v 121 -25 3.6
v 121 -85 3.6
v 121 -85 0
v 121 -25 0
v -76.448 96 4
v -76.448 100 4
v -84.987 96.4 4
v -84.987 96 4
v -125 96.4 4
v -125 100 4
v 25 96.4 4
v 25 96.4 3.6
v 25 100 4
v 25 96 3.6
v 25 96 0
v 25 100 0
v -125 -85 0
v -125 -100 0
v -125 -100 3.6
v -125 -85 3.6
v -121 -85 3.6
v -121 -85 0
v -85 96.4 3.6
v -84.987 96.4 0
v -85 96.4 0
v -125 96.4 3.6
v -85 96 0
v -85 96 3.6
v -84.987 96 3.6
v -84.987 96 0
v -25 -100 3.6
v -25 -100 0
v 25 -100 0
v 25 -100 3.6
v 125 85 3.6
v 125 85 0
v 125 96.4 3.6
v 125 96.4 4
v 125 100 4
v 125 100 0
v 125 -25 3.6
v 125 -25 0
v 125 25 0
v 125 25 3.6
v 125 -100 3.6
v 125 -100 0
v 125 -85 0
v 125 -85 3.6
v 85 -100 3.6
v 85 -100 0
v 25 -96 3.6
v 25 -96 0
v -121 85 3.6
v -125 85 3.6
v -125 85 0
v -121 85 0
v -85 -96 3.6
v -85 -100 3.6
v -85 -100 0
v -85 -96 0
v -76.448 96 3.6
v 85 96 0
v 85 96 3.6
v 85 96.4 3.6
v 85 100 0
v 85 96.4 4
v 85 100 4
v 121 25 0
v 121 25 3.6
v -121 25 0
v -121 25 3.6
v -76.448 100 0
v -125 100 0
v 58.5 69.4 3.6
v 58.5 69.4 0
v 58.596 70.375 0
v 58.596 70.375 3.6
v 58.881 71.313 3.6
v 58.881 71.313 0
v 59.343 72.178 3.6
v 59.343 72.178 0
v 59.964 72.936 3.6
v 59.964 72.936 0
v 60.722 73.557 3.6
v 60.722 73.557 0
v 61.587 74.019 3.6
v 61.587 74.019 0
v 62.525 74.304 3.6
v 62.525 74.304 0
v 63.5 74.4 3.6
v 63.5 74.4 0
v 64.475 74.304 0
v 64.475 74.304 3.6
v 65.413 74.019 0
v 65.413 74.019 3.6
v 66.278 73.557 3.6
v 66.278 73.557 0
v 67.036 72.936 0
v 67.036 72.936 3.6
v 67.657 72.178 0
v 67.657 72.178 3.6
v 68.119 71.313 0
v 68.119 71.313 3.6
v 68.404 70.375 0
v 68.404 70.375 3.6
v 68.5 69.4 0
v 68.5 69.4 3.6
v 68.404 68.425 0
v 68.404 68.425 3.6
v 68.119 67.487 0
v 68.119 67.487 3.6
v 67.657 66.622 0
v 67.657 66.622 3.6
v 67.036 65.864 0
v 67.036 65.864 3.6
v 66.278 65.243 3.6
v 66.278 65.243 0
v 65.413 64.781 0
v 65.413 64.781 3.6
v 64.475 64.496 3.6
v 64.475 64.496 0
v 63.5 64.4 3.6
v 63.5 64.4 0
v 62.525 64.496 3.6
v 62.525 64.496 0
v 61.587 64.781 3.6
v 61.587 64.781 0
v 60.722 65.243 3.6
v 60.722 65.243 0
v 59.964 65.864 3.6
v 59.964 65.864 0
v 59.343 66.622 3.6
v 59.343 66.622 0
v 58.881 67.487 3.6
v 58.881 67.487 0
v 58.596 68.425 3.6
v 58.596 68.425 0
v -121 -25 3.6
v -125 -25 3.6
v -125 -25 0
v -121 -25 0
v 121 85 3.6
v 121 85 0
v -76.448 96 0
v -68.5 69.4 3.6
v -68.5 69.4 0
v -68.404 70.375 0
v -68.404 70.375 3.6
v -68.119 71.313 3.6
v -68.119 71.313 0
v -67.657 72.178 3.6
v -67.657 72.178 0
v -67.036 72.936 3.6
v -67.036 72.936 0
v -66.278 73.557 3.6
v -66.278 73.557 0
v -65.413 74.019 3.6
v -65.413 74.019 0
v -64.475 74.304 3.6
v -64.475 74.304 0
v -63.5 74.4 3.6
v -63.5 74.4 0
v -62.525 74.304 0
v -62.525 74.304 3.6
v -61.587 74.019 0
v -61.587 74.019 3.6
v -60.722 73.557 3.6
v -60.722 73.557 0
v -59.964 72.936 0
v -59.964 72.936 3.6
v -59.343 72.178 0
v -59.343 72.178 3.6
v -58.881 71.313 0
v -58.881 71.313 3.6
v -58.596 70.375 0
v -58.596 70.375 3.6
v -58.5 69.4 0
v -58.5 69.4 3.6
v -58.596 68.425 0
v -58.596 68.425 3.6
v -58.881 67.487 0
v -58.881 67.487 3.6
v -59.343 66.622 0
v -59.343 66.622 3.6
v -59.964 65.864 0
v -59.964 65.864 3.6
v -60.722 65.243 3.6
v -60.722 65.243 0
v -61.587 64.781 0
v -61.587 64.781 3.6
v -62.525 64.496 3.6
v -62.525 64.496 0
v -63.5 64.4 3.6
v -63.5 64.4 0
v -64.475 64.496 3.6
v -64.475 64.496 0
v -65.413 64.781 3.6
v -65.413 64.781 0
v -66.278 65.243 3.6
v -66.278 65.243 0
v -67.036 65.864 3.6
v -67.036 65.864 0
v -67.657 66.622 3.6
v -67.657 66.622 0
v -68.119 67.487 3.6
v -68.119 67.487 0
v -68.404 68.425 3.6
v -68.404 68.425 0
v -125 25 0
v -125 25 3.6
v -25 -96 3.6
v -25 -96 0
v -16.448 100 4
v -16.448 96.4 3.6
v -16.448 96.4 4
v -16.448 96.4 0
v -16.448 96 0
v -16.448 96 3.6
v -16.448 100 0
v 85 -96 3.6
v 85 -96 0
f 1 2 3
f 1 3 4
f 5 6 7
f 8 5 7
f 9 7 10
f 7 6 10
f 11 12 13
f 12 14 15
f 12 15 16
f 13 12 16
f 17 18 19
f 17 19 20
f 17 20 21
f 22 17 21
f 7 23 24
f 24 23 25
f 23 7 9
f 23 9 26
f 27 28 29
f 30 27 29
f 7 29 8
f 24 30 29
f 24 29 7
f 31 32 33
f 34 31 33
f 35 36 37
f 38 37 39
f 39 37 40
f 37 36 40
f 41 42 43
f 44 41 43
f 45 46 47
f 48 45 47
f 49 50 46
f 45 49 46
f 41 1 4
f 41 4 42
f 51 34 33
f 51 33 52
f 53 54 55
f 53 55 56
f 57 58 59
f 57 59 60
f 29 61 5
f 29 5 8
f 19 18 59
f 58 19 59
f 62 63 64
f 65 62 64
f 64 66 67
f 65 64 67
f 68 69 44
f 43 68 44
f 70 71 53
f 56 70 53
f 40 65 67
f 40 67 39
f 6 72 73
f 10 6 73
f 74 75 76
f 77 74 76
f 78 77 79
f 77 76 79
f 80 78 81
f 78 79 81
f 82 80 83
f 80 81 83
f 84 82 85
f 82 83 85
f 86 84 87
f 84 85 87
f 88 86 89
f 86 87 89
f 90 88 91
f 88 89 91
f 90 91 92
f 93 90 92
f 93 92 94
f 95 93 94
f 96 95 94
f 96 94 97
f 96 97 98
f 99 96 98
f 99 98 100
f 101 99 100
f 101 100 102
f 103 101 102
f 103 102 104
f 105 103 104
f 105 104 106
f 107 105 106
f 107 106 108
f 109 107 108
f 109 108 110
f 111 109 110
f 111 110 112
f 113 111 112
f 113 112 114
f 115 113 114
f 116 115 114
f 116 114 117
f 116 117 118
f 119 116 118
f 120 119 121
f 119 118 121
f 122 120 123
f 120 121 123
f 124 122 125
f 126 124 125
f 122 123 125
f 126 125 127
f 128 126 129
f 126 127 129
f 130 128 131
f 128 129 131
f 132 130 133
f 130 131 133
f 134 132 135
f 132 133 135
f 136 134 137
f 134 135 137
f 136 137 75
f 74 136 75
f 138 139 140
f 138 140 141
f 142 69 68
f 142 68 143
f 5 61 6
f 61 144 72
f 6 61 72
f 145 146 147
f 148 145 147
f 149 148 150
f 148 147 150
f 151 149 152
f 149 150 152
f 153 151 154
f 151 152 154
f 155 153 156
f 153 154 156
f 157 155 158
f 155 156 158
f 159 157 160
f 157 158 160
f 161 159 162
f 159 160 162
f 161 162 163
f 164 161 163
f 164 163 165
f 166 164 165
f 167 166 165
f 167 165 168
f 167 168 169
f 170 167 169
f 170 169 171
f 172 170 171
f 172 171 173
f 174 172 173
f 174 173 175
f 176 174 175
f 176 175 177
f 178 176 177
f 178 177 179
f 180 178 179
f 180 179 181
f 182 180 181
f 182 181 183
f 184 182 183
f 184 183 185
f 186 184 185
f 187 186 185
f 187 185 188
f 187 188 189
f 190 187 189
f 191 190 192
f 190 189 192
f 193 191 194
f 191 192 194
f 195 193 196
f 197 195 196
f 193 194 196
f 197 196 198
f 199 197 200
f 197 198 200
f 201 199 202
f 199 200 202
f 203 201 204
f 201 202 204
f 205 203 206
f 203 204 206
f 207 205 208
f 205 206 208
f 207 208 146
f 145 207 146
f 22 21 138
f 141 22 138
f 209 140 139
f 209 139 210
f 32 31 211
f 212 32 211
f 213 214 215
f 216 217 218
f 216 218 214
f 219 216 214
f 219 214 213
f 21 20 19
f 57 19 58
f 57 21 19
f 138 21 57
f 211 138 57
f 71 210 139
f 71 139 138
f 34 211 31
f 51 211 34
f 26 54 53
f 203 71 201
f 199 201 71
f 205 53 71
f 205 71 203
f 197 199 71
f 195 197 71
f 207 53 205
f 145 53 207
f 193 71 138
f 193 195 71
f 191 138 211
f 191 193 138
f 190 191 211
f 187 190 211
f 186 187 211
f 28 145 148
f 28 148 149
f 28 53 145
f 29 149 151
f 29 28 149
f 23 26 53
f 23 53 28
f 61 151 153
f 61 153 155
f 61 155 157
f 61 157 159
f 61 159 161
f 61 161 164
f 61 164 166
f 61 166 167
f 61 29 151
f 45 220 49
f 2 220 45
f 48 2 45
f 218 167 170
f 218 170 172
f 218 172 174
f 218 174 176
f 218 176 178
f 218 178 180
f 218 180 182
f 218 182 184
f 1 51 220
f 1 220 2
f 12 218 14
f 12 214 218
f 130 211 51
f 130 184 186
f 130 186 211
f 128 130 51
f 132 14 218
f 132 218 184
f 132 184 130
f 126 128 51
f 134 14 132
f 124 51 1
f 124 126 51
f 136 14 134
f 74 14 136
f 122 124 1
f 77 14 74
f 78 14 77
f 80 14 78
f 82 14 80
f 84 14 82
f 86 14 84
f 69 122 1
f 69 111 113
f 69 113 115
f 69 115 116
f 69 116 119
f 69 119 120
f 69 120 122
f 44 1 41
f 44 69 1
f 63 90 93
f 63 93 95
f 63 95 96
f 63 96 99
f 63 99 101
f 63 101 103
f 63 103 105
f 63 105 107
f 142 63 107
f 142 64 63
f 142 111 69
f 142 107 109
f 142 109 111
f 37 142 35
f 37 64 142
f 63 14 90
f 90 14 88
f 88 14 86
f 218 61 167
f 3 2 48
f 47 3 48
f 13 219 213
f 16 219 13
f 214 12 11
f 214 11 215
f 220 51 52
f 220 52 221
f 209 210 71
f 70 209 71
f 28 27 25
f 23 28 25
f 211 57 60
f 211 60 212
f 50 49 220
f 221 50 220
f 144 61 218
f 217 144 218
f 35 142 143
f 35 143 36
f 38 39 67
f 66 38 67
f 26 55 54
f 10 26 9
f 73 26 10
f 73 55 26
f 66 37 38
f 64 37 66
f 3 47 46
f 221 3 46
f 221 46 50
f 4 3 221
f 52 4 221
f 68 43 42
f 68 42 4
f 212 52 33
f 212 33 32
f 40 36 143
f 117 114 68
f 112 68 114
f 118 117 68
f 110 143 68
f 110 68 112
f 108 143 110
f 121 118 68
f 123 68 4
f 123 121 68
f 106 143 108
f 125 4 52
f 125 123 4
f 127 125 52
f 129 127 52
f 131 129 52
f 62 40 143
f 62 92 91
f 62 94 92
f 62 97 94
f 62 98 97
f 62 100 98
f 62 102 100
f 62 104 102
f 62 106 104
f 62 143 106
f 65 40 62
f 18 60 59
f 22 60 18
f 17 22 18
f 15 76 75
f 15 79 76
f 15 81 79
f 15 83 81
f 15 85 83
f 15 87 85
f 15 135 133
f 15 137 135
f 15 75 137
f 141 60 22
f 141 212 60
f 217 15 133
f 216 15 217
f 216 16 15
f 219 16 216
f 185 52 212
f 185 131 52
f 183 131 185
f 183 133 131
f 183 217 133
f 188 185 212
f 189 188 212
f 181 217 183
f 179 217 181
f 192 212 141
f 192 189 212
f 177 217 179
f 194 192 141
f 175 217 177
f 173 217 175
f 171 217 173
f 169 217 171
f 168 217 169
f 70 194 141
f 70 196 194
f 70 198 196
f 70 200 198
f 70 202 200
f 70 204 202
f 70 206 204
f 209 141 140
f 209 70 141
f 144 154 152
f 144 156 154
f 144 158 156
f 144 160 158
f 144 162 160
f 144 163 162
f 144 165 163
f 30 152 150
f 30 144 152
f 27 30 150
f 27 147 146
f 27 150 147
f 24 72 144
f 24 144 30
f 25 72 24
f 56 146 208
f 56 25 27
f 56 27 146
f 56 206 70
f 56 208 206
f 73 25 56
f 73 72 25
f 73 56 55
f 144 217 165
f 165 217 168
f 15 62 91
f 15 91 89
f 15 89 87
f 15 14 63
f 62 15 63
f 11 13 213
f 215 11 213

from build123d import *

# Parameters (mm, degrees)
SKETCH_1_W          = 250
SKETCH_1_H          = 200
EXTRUDE_1_DEPTH     = 3.6
SKETCH_2_W          = 4
SKETCH_2_H          = 60
CUT_EXTRUDE_1_DEPTH = 10
SKETCH_3_W          = 60
SKETCH_3_H          = 4
CUT_EXTRUDE_2_DEPTH = 10
SKETCH_4_R          = 5
CUT_EXTRUDE_3_DEPTH = 10
SKETCH_5_W          = 250
SKETCH_5_H          = 3.6
EXTRUDE_2_DEPTH     = 4
SKETCH_6_W          = 60
SKETCH_6_H          = 4
CUT_EXTRUDE_4_DEPTH = 161.128073741
SKETCH_7_W          = 4
SKETCH_7_H          = 3.6
EXTRUDE_3_DEPTH     = 8.5
SKETCH_8_W          = 68.538276959
SKETCH_8_H          = 3.6
CUT_EXTRUDE_5_DEPTH = 8.5
SKETCH_9_W          = 8.538276959
SKETCH_9_H          = 4
EXTRUDE_4_DEPTH     = 4
SKETCH_10_W         = 60
SKETCH_10_H         = 4
CUT_EXTRUDE_6_DEPTH = 8.5


with BuildPart() as part:
    # 草图1 → 凸台-拉伸1 (new body)
    with BuildSketch(Plane.XY):
        Rectangle(SKETCH_1_W, SKETCH_1_H)
    extrude(amount=EXTRUDE_1_DEPTH)

    # 草图2 → 切除-拉伸1 (cut)
    with BuildSketch(Plane.XY.offset(3.6)):
        with Locations((-123, 55)):
            Rectangle(SKETCH_2_W, SKETCH_2_H)
        with Locations((123, 55)):
            Rectangle(SKETCH_2_W, SKETCH_2_H)
        with Locations((-123, -55)):
            Rectangle(SKETCH_2_W, SKETCH_2_H)
        with Locations((123, -55)):
            Rectangle(SKETCH_2_W, SKETCH_2_H)
    extrude(amount=-CUT_EXTRUDE_1_DEPTH, mode=Mode.SUBTRACT)

    # 草图3 → 切除-拉伸2 (cut)
    with BuildSketch(Plane.XY.offset(3.6)):
        with Locations((-55, -98)):
            Rectangle(SKETCH_3_W, SKETCH_3_H)
        with Locations((55, -98)):
            Rectangle(SKETCH_3_W, SKETCH_3_H)
        with Locations((55, 98)):
            Rectangle(SKETCH_3_W, SKETCH_3_H)
        with Locations((-55, 98)):
            Rectangle(SKETCH_3_W, SKETCH_3_H)
    extrude(amount=-CUT_EXTRUDE_2_DEPTH, mode=Mode.SUBTRACT)

    # 草图4 → 切除-拉伸3 (cut)
    with BuildSketch(Plane(origin=(0, 0, 0), x_dir=(-1, 0, 0), z_dir=(0, 0, -1))):
        with Locations((-63.5, 69.4)):
            Circle(SKETCH_4_R)
        with Locations((63.5, 69.4)):
            Circle(SKETCH_4_R)
    extrude(amount=-CUT_EXTRUDE_3_DEPTH, mode=Mode.SUBTRACT)

    # 草图5 → 凸台-拉伸2 (add)
    with BuildSketch(Plane(origin=(0, 0, 0), x_dir=(-1, 0, 0), z_dir=(0, 0, -1))):
        with Locations((0, 98.2)):
            Rectangle(SKETCH_5_W, SKETCH_5_H)
    extrude(amount=-EXTRUDE_2_DEPTH)

    # 草图6 → 切除-拉伸4 (cut, through all)
    with BuildSketch(Plane(origin=(0, 0, 0), x_dir=(-1, 0, 0), z_dir=(0, 0, -1))):
        with Locations((-55, 98)):
            Rectangle(SKETCH_6_W, SKETCH_6_H)
        with Locations((55, 98)):
            Rectangle(SKETCH_6_W, SKETCH_6_H)
    extrude(amount=-CUT_EXTRUDE_4_DEPTH, mode=Mode.SUBTRACT)

    # 草图7 → 凸台-拉伸3 (add)
    with BuildSketch(Plane(origin=(-85, 0, 0), x_dir=(0, 0, -1), z_dir=(1, 0, 0))):
        with Locations((-2, 98.2)):
            Rectangle(SKETCH_7_W, SKETCH_7_H)
    extrude(amount=EXTRUDE_3_DEPTH)

    # 草图8 → 切除-拉伸5 (cut)
    with BuildSketch(Plane(origin=(0, 0, 0), x_dir=(-1, 0, 0), z_dir=(0, 0, -1))):
        with Locations((50.717618655, 98.2)):
            Rectangle(SKETCH_8_W, SKETCH_8_H)
    extrude(amount=-CUT_EXTRUDE_5_DEPTH, mode=Mode.SUBTRACT)

    # 草图9 → 凸台-拉伸4 (add)
    with BuildSketch(Plane(origin=(0, 0, 0), x_dir=(-1, 0, 0), z_dir=(0, 0, -1))):
        with Locations((80.717618655, 98)):
            Rectangle(SKETCH_9_W, SKETCH_9_H)
    extrude(amount=-EXTRUDE_4_DEPTH)

    # 草图10 → 切除-拉伸6 (cut)
    with BuildSketch(Plane(origin=(0, 0, 0), x_dir=(-1, 0, 0), z_dir=(0, 0, -1))):
        with Locations((46.448480175, 98)):
            Rectangle(SKETCH_10_W, SKETCH_10_H)
    extrude(amount=-CUT_EXTRUDE_6_DEPTH, mode=Mode.SUBTRACT)


solid = part.part
